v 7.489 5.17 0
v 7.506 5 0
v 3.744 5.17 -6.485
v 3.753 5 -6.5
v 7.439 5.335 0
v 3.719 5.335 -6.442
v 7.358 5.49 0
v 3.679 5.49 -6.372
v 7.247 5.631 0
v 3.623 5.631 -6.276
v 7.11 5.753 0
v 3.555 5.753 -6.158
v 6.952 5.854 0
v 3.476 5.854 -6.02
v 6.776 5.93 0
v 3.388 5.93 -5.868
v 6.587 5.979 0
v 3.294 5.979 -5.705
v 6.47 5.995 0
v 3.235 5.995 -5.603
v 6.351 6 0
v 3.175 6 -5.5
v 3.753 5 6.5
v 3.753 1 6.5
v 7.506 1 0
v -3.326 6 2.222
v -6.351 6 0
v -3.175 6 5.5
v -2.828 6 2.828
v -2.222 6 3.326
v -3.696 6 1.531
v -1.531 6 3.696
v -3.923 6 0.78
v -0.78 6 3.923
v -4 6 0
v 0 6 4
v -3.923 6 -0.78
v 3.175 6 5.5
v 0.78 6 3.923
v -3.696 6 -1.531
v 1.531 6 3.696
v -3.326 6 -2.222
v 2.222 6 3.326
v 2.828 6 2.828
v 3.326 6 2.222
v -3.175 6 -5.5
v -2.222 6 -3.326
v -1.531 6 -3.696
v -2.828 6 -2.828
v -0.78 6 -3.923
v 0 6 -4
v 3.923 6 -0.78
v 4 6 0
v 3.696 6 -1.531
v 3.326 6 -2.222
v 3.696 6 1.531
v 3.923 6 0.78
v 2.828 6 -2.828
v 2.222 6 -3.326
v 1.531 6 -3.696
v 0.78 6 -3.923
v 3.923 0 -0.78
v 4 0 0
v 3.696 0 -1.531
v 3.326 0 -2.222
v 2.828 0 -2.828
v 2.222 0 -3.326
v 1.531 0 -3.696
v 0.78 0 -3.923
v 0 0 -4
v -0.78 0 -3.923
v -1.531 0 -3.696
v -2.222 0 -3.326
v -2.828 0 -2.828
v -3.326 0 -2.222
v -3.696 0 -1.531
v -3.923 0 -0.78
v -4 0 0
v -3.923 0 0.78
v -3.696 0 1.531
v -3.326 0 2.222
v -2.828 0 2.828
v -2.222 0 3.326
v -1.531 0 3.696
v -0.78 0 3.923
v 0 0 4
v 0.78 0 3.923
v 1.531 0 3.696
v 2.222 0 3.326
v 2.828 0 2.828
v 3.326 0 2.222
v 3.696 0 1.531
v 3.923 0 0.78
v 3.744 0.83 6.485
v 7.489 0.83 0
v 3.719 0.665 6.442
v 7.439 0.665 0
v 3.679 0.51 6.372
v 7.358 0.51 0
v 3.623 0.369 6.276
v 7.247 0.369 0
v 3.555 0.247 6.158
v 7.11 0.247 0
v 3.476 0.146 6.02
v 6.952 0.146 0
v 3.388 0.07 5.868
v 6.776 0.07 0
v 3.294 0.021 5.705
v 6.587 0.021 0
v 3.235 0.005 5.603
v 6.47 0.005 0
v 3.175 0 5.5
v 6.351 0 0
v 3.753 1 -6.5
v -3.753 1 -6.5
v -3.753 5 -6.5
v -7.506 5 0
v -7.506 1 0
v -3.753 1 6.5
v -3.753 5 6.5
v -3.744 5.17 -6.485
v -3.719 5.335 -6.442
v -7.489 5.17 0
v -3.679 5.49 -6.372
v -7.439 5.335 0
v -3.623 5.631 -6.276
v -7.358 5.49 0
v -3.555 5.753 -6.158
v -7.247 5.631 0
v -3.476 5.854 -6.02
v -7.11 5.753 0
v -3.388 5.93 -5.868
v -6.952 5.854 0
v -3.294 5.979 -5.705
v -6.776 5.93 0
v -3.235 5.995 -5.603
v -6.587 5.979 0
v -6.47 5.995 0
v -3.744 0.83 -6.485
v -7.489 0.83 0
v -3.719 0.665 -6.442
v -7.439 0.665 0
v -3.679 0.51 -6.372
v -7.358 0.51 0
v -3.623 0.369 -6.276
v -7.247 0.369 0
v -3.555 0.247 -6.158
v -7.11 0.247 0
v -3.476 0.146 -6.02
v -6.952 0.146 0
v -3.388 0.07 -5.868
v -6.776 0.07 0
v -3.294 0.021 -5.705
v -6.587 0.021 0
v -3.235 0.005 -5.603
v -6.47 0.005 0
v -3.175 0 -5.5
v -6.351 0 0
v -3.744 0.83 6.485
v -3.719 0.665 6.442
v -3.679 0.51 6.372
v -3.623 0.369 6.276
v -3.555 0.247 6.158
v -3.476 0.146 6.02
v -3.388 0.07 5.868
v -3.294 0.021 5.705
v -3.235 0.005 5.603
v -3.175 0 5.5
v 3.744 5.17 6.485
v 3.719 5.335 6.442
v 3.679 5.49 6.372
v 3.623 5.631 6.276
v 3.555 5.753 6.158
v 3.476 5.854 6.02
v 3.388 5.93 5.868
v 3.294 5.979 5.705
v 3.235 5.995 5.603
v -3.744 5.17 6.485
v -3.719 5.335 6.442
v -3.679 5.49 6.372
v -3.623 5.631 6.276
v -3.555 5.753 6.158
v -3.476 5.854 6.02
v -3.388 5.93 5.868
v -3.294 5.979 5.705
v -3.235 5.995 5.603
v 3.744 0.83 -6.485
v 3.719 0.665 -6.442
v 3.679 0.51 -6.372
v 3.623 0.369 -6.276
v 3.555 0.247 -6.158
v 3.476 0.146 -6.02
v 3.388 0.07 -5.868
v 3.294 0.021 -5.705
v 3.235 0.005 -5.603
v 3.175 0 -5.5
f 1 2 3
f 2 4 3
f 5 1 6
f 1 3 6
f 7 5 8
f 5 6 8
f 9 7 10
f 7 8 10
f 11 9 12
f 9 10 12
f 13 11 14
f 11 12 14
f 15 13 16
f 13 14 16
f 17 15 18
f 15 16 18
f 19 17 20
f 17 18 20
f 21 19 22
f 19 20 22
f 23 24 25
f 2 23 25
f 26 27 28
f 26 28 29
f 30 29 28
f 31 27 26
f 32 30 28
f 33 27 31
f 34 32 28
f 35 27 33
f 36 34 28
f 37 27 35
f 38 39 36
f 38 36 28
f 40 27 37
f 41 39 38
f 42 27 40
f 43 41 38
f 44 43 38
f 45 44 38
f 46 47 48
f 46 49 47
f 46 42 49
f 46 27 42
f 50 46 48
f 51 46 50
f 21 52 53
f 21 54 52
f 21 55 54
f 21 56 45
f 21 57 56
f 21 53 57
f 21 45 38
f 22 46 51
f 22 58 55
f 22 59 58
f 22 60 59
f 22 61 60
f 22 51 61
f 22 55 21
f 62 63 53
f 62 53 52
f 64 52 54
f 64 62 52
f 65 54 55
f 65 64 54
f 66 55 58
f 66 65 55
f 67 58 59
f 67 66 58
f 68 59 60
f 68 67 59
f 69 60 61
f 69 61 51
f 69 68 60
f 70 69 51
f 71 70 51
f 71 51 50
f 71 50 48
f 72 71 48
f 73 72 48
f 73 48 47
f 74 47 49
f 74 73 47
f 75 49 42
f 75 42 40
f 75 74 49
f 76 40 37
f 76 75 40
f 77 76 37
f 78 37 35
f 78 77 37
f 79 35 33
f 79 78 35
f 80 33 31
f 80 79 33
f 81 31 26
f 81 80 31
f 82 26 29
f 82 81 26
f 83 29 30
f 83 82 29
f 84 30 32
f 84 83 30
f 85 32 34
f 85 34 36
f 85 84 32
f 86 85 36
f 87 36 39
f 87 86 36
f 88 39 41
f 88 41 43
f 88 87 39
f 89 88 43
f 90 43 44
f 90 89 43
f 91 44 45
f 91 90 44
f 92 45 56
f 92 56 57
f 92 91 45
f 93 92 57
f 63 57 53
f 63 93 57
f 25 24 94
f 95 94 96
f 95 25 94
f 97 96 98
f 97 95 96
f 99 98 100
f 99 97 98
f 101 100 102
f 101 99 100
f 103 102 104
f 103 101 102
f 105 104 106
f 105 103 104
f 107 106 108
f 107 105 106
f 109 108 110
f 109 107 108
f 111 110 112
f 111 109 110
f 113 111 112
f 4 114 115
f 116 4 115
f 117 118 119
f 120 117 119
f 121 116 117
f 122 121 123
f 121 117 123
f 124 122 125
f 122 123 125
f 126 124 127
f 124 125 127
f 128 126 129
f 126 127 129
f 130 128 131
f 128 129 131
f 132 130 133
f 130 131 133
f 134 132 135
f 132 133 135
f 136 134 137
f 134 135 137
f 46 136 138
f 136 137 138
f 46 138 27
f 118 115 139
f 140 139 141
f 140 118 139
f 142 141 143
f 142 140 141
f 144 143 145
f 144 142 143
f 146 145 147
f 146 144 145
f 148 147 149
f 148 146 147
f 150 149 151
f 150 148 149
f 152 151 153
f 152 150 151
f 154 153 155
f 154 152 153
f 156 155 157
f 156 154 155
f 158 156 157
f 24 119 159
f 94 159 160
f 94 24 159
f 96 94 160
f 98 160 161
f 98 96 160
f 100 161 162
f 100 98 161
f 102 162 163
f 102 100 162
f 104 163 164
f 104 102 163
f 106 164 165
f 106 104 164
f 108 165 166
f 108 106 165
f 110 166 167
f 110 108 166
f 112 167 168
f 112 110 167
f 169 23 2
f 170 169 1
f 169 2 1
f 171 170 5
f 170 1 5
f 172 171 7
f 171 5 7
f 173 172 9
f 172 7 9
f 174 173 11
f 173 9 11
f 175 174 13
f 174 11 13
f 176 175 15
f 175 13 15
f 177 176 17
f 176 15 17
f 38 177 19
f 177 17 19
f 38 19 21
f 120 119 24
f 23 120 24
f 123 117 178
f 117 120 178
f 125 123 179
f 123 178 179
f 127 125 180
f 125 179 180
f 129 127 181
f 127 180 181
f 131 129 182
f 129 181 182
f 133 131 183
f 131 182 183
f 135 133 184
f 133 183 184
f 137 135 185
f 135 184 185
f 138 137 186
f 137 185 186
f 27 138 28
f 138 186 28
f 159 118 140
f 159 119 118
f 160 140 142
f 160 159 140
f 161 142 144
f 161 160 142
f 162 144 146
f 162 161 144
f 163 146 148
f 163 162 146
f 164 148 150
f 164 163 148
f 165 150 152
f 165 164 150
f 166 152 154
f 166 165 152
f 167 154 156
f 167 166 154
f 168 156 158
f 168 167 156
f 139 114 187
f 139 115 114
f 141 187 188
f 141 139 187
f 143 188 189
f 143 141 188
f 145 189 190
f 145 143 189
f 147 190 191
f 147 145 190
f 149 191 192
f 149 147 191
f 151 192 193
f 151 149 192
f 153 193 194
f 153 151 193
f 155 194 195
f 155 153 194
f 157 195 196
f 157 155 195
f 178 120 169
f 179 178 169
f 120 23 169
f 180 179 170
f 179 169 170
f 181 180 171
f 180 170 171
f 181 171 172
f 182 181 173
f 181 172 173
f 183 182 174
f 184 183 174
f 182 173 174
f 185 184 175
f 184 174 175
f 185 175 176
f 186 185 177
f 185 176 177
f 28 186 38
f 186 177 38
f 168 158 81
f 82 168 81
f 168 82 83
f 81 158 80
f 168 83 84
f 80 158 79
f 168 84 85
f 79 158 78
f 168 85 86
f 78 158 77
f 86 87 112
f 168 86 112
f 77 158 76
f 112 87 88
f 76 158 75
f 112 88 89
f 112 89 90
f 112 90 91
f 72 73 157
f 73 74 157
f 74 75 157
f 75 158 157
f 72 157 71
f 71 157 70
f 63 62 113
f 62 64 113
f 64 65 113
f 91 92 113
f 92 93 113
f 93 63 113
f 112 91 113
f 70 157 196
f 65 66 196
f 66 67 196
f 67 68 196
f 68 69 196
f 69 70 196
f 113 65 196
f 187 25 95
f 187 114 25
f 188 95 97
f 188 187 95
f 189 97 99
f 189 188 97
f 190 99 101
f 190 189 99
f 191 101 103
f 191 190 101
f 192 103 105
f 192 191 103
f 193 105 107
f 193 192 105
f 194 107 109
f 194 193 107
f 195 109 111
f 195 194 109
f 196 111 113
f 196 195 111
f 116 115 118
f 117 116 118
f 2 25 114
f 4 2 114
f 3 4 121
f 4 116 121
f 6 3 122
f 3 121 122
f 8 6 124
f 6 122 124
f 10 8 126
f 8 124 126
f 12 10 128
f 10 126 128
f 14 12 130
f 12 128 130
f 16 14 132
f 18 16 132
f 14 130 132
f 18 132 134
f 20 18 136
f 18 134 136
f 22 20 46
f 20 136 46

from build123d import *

# Parameters (mm, degrees)
SKETCH1_R           = 4
BOSS_EXTRUDE1_DEPTH = 6
FILLET1_R           = 1


with BuildPart() as part:
    # Sketch1 → Boss-Extrude1 (new body)
    with BuildSketch(Plane(origin=(0, 0, 0), x_dir=(1, 0, 0), z_dir=(0, 1, 0))):
        Polygon((7.505553499, 0), (3.75277675, 6.5), (-3.75277675, 6.5), (-7.505553499, 0), (-3.75277675, -6.5), (3.75277675, -6.5), align=None)
        Circle(SKETCH1_R, mode=Mode.SUBTRACT)
    extrude(amount=BOSS_EXTRUDE1_DEPTH)

    # Fillet1
    fillet1_edges = [part.edges().sort_by_distance(p)[0] for p in [
        (0, 6, -6.5),
        (-5.629165125, 6, -3.25),
        (-5.629165125, 6, 3.25),
        (0, 6, 6.5),
        (5.629165125, 6, 3.25),
        (0, 0, 6.5),
        (-5.629165125, 0, 3.25),
        (-5.629165125, 0, -3.25),
        (0, 0, -6.5),
        (5.629165125, 0, -3.25),
        (5.629165125, 0, 3.25),
        (5.629165125, 6, -3.25),
    ]]
    fillet(fillet1_edges, radius=FILLET1_R)


solid = part.part
